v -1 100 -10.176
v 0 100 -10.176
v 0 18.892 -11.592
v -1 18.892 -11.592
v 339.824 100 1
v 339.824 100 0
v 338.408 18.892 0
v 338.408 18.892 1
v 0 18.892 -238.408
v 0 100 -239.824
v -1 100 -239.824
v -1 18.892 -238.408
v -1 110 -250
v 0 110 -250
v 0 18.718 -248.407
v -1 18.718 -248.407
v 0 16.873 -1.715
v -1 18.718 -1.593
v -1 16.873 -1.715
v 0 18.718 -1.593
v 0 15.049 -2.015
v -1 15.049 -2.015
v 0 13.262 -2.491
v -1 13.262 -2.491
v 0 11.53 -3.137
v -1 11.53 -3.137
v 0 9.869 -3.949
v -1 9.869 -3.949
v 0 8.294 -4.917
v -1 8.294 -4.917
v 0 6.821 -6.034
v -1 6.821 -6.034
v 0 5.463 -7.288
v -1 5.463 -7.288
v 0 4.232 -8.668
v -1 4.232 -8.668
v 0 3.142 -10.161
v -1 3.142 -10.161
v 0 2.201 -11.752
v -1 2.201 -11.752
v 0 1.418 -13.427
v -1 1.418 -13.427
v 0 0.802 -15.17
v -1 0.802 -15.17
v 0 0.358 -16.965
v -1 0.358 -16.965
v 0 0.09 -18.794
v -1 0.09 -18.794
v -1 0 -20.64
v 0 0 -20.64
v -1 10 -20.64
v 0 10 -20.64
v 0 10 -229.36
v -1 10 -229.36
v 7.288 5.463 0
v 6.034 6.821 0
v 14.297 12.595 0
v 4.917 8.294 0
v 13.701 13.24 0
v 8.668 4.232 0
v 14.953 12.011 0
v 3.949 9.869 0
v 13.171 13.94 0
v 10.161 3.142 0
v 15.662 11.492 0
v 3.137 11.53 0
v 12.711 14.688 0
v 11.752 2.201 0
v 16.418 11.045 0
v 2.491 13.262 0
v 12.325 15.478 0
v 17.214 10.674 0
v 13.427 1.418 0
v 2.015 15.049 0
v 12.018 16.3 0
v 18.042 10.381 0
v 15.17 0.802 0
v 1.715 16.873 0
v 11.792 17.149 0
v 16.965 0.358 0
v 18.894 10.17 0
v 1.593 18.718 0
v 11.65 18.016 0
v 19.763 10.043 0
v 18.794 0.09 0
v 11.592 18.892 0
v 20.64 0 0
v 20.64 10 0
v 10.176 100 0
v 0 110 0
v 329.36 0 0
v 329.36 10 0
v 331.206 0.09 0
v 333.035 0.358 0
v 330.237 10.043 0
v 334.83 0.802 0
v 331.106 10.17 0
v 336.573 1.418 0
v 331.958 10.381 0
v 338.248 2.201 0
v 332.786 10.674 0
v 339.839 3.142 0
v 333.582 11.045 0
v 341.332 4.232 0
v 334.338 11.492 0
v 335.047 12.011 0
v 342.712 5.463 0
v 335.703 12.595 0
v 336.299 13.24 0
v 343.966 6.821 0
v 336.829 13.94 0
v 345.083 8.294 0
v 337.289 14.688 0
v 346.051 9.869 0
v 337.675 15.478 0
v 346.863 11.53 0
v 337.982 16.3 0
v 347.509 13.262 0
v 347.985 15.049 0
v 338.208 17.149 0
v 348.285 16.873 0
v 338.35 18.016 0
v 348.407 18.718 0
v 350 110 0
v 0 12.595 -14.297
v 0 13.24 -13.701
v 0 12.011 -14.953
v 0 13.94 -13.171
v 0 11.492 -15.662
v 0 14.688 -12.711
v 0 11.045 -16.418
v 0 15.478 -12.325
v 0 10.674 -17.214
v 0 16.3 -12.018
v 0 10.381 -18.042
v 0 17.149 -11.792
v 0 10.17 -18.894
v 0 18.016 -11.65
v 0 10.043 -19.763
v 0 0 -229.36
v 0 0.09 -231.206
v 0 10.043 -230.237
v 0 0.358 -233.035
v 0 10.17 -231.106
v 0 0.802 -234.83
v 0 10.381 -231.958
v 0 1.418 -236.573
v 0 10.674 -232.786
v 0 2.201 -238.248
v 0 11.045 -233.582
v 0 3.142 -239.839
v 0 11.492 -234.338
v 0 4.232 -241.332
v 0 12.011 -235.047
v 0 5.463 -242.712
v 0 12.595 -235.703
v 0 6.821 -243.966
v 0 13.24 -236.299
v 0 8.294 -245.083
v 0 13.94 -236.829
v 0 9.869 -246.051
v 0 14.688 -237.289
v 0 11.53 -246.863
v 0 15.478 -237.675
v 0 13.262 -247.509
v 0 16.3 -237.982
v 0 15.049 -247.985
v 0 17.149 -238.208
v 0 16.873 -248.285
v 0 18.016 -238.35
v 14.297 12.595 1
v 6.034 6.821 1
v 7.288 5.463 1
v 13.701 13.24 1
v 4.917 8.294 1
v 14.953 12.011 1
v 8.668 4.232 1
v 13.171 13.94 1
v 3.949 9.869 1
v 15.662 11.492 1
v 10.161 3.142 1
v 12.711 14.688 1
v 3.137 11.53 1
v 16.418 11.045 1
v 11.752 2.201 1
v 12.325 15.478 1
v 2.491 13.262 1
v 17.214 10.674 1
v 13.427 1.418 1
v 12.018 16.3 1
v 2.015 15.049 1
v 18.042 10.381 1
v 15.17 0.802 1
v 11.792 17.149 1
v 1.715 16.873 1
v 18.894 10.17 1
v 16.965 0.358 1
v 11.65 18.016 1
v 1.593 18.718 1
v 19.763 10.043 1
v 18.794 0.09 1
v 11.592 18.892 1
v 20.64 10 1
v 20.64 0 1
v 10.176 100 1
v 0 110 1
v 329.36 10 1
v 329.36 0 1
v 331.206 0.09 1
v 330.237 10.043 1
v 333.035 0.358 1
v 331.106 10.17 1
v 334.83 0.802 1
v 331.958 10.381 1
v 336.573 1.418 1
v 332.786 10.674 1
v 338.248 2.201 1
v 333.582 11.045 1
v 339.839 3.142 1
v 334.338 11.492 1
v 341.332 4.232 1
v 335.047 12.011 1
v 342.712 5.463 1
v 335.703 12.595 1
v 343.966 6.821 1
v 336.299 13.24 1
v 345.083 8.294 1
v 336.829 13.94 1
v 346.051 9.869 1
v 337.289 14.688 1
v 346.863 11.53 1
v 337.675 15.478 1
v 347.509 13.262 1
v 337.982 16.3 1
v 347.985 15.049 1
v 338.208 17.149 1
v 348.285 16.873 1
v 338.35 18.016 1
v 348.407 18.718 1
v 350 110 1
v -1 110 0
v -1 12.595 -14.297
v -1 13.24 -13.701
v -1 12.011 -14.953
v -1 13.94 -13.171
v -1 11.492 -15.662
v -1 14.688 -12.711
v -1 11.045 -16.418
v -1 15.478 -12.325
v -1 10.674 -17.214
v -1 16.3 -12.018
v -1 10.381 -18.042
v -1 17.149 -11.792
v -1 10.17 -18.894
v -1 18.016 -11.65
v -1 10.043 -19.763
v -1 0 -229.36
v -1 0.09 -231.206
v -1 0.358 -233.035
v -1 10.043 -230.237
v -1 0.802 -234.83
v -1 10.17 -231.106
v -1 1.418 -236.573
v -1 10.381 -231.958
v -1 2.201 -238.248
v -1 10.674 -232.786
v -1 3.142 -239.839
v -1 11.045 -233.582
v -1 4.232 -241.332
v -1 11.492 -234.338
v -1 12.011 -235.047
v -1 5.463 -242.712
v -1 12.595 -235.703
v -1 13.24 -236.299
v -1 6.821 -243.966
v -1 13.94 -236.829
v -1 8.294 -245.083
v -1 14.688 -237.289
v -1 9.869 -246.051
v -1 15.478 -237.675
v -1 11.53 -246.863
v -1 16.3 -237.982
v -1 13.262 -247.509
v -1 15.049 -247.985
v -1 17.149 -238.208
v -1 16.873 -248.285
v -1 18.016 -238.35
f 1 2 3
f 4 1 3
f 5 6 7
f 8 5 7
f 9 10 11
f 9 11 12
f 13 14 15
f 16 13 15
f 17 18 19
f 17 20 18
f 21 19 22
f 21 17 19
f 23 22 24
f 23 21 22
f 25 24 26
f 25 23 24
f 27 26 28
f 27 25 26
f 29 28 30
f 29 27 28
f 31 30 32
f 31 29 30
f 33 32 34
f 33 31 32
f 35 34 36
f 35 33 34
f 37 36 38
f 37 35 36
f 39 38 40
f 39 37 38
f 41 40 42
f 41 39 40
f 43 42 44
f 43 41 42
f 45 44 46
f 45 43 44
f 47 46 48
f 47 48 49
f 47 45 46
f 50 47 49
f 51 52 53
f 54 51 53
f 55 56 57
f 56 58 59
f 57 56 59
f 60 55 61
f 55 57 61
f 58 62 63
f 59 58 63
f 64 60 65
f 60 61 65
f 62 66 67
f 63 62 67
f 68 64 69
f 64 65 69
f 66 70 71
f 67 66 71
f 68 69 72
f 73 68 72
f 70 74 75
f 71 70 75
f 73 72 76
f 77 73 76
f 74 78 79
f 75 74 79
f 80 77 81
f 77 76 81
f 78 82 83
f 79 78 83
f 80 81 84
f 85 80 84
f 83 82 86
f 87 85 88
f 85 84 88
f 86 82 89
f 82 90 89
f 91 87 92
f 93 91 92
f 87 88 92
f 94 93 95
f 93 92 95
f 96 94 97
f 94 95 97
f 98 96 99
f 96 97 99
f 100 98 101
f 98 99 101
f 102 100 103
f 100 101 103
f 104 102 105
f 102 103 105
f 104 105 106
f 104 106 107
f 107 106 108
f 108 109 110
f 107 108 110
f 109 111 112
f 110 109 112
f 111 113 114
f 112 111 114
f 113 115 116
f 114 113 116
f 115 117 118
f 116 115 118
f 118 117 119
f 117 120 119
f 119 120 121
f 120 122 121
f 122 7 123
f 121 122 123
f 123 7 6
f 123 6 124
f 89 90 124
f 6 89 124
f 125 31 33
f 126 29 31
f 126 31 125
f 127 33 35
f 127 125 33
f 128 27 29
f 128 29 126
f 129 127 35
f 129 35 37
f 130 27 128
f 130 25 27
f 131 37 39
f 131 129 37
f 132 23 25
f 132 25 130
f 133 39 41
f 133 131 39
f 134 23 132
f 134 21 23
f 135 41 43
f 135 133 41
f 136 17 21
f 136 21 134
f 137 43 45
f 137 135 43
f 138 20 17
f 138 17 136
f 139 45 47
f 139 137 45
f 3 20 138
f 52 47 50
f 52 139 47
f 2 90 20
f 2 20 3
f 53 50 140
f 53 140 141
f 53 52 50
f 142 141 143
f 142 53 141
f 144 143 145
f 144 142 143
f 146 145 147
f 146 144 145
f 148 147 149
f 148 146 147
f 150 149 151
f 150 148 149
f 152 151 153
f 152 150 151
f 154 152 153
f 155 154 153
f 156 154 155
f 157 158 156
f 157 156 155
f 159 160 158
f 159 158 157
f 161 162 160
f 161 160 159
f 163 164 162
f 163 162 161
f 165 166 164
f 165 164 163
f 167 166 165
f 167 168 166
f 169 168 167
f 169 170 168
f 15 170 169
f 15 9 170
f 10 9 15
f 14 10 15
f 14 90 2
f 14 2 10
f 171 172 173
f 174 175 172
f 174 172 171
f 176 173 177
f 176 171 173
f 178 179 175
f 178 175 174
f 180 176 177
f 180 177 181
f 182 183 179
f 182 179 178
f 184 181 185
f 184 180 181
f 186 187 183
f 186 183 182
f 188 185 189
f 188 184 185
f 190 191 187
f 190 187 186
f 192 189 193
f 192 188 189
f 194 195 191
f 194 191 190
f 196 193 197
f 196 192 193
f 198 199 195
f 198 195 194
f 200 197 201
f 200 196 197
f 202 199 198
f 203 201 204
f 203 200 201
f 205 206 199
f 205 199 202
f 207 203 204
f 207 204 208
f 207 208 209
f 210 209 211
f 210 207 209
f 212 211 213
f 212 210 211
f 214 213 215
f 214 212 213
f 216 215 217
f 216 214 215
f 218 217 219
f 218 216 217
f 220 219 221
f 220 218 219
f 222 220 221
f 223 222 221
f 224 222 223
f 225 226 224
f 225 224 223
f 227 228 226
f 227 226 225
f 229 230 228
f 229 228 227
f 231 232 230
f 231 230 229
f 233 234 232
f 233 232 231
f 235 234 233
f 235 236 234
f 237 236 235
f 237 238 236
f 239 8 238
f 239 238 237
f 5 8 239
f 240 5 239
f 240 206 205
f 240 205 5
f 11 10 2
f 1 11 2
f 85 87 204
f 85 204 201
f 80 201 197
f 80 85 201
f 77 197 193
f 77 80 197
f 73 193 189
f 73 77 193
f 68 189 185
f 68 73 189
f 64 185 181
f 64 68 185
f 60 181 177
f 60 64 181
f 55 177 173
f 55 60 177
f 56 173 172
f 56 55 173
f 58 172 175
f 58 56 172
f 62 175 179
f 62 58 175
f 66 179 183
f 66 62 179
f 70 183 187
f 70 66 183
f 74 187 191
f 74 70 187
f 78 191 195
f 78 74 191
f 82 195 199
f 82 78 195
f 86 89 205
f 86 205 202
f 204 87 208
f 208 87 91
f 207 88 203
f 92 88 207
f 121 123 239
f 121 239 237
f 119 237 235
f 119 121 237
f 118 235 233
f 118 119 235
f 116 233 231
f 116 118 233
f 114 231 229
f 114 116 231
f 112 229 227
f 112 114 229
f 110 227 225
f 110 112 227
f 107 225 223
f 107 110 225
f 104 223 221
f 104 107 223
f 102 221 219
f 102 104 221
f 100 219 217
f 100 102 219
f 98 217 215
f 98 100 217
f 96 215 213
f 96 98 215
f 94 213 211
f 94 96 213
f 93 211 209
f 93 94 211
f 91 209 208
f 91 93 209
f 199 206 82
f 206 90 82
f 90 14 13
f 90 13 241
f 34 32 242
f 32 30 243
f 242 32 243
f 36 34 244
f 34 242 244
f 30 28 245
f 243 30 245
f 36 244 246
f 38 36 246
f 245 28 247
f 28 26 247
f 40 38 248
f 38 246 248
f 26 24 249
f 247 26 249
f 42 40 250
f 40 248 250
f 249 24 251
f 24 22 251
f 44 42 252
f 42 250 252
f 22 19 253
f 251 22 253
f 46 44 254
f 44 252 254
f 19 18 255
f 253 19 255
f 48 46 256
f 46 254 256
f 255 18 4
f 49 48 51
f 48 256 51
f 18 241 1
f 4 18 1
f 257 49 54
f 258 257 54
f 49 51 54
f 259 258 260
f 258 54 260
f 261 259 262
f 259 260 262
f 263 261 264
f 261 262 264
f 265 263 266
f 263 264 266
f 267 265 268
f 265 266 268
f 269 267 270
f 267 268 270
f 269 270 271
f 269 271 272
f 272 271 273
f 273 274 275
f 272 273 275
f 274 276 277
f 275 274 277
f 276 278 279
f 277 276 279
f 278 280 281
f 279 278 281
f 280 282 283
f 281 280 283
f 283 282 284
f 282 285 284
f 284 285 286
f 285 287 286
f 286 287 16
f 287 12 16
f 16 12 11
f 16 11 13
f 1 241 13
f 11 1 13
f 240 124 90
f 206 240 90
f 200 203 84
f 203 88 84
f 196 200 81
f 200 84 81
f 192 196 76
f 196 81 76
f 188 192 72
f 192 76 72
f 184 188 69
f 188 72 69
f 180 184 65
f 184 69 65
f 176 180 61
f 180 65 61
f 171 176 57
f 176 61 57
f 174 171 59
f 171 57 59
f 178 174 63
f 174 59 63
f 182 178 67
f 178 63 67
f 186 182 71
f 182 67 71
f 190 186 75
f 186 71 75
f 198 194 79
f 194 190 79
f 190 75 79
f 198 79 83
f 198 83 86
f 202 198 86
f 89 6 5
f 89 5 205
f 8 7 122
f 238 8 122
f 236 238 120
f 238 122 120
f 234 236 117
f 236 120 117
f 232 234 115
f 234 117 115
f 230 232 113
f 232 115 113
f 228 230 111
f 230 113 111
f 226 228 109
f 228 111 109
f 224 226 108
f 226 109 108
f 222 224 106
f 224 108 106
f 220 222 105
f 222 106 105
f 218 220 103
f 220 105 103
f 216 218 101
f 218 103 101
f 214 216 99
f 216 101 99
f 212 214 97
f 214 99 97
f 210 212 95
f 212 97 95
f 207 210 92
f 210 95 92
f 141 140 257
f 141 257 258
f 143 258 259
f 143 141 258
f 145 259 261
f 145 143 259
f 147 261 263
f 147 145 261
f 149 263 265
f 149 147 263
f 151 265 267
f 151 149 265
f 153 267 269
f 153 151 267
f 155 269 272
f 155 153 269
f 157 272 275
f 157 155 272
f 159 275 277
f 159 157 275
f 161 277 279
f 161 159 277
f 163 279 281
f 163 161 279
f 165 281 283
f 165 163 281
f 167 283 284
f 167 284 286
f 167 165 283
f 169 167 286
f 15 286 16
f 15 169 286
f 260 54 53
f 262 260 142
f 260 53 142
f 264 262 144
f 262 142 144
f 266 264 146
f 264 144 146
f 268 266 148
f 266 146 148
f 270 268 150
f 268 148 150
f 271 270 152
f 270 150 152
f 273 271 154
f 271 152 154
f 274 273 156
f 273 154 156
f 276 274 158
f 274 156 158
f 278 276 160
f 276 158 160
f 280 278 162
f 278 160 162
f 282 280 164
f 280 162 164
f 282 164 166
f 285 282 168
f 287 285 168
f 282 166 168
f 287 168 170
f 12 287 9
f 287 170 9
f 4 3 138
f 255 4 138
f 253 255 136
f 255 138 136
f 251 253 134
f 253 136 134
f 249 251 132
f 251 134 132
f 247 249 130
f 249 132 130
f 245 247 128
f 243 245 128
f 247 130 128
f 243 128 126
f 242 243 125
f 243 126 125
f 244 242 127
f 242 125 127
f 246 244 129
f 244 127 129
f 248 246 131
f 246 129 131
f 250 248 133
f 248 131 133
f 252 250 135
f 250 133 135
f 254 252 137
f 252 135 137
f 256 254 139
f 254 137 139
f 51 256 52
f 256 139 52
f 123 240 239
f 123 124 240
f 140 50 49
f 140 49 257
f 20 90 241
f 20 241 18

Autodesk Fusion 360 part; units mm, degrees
sketch "FRONT" plane through (0, 0, 0) normal (0, 0, 1) x (1, 0, 0)
  line L0 (0, 0) -> (0, 110) construction
  line L1 (0, 110) -> (1.5933, 18.7175)
  line L2 (0, 110) -> (103.8151, 110) construction
  line L3 (20.6404, 0) -> (329.3596, 0)
  line L4 (350, 0) -> (350, 110) construction
  line L5 (350, 110) -> (348.4067, 18.7175)
  line L6 (350, 110) -> (486.4264, 110) construction
  line L7 (350, 110) -> (375.4, 110)
  line L8 (375.4, 110) -> (375.4, -25.4)
  line L9 (375.4, -25.4) -> (-25.4, -25.4)
  line L10 (-25.4, -25.4) -> (-25.4, 110)
  line L11 (-25.4, 110) -> (0, 110)
  arc A0 (1.5933, 18.7175) -> (20.6404, 0) centre (20.6404, 19.05) ccw
  arc A1 (329.3596, 0) -> (348.4067, 18.7175) centre (329.3596, 19.05) ccw
  line L12 (350, 110) -> (0, 110)
  line L13 (339.8239, 100) -> (10.1761, 100)
  line L14 (10.1761, 100) -> (11.5918, 18.8921)
  arc A2 (11.5918, 18.8921) -> (20.6404, 10) centre (20.6404, 19.05) ccw
  line L15 (20.6404, 10) -> (329.3596, 10)
  arc A3 (329.3596, 10) -> (338.4082, 18.8921) centre (329.3596, 19.05) ccw
  line L16 (339.8239, 100) -> (338.4082, 18.8921)
  dimension "d15" = 110
  dimension "d16" = 89
  dimension "d17" = 350
  dimension "d18" = 110
  dimension "d19" = 91
  dimension "d20" = 25.4
  dimension "d21" = 135.4
  dimension "d22" = 400.8
  dimension "d23" = 135.4
  dimension "d24" = 19.05
sketch "SIDE" plane through (0, 0, 0) normal (1, 0, 0) x (0, 0, -1)
  line L0 (0, 0) -> (0, 110) construction
  line L1 (20.6404, 0) -> (229.3596, 0)
  line L2 (250, 0) -> (250, 110) construction
  line L3 (250, 110) -> (248.4067, 18.7175)
  line L4 (250, 110) -> (374.6664, 110) construction
  line L5 (0, 110) -> (1.5933, 18.7175)
  line L6 (0, 110) -> (107.9664, 110) construction
  line L7 (0, 110) -> (-25.4, 110)
  line L8 (-25.4, 110) -> (-25.4, -25.4)
  line L9 (-25.4, -25.4) -> (275.4, -25.4)
  line L10 (275.4, -25.4) -> (275.4, 110)
  line L11 (275.4, 110) -> (250, 110)
  arc A0 (1.5933, 18.7175) -> (20.6404, 0) centre (20.6404, 19.05) ccw
  arc A1 (229.3596, 0) -> (248.4067, 18.7175) centre (229.3596, 19.05) ccw
  line L12 (250, 110) -> (0, 110)
  arc A2 (11.5918, 18.8921) -> (20.6404, 10) centre (20.6404, 19.05) ccw
  line L13 (20.6404, 10) -> (229.3596, 10)
  arc A3 (229.3596, 10) -> (238.4082, 18.8921) centre (229.3596, 19.05) ccw
  line L14 (239.8239, 100) -> (238.4082, 18.8921)
  line L15 (239.8239, 100) -> (10.1761, 100)
  line L16 (10.1761, 100) -> (11.5918, 18.8921)
  dimension "d151" = 110
  dimension "d152" = 250
  dimension "d153" = 110
  dimension "d154" = 91
  dimension "d155" = 89
  dimension "d156" = 25.4
  dimension "d157" = 135.4
  dimension "d158" = 300.8
  dimension "d159" = 135.4
  dimension "d160" = 25.4
  dimension "d161" = 19.05
extrude "Extrude36" add sketch "SIDE" against normal blind 1 contours L1 L3 L5 A0 A1 L12 makes body 1
extrude "Extrude37" add sketch "FRONT" along normal blind 1 separate body contours L1 L3 L5 A0 A1 L12 makes body 2
copy_body "Body->Comp8" bodies 1 removing the originals makes body 3 in component "Side Test"
copy_body "Body->Comp9" bodies 2 removing the originals makes body 4 in component "Front Test"
ref_plane "WorkPlane3" through (175, 0, 0) normal (1, 0, 0) x (0, 1, 0)
split "Split1" [suppressed] in component "Front Test"
component "Side Test" placed x (1, 0, 0) y (0, 1, 0) z (0, 0, 1) at (0, 0, 0)
component "Front Test" placed x (1, 0, 0) y (0, 1, 0) z (0, 0, 1) at (0, 0, 0)
equation "Overall_HT = 110 mm"
equation "OVERALL_LENGTH = 350 mm"
equation "OVERALL_WIDTH = 250 mm"
equation "BOTTOM_CORNER_RADIUS = 0.75 in"
equation "SIDE_WALL_TAPER = 1 deg"
equation "FRONT_WALL_TAPER = 1 deg"
equation "GRID_SPACING = 15 mm"
equation "d15 = Overall_HT"
equation "d16 = 90 deg - SIDE_WALL_TAPER"
equation "d17 = OVERALL_LENGTH"
equation "d18 = Overall_HT"
equation "d19 = 90 deg + SIDE_WALL_TAPER"
equation "d21 = Overall_HT + 1 in"
equation "d22 = OVERALL_LENGTH + 2 in"
equation "d23 = Overall_HT + 1 in"
equation "d24 = BOTTOM_CORNER_RADIUS"
equation "d151 = Overall_HT"
equation "d152 = OVERALL_WIDTH"
equation "d153 = Overall_HT"
equation "d154 = 90 deg + FRONT_WALL_TAPER"
equation "d155 = 90 deg - FRONT_WALL_TAPER"
equation "d156 = 1\""
equation "d157 = Overall_HT + 1\""
equation "d158 = OVERALL_WIDTH + 2\""
equation "d159 = Overall_HT + 1\""
equation "d160 = 1\""
equation "d161 = BOTTOM_CORNER_RADIUS"
equation "d571 = -TEST_OFFSET"
equation "d572 = -TEST_OFFSET"
equation "TEST_THICK = 1 mm"
equation "d574 = -TEST_THICK"
equation "d576 = TEST_THICK"
equation "TEST_OFFSET = 10 mm"
equation "d579 = OVERALL_LENGTH / 2"
